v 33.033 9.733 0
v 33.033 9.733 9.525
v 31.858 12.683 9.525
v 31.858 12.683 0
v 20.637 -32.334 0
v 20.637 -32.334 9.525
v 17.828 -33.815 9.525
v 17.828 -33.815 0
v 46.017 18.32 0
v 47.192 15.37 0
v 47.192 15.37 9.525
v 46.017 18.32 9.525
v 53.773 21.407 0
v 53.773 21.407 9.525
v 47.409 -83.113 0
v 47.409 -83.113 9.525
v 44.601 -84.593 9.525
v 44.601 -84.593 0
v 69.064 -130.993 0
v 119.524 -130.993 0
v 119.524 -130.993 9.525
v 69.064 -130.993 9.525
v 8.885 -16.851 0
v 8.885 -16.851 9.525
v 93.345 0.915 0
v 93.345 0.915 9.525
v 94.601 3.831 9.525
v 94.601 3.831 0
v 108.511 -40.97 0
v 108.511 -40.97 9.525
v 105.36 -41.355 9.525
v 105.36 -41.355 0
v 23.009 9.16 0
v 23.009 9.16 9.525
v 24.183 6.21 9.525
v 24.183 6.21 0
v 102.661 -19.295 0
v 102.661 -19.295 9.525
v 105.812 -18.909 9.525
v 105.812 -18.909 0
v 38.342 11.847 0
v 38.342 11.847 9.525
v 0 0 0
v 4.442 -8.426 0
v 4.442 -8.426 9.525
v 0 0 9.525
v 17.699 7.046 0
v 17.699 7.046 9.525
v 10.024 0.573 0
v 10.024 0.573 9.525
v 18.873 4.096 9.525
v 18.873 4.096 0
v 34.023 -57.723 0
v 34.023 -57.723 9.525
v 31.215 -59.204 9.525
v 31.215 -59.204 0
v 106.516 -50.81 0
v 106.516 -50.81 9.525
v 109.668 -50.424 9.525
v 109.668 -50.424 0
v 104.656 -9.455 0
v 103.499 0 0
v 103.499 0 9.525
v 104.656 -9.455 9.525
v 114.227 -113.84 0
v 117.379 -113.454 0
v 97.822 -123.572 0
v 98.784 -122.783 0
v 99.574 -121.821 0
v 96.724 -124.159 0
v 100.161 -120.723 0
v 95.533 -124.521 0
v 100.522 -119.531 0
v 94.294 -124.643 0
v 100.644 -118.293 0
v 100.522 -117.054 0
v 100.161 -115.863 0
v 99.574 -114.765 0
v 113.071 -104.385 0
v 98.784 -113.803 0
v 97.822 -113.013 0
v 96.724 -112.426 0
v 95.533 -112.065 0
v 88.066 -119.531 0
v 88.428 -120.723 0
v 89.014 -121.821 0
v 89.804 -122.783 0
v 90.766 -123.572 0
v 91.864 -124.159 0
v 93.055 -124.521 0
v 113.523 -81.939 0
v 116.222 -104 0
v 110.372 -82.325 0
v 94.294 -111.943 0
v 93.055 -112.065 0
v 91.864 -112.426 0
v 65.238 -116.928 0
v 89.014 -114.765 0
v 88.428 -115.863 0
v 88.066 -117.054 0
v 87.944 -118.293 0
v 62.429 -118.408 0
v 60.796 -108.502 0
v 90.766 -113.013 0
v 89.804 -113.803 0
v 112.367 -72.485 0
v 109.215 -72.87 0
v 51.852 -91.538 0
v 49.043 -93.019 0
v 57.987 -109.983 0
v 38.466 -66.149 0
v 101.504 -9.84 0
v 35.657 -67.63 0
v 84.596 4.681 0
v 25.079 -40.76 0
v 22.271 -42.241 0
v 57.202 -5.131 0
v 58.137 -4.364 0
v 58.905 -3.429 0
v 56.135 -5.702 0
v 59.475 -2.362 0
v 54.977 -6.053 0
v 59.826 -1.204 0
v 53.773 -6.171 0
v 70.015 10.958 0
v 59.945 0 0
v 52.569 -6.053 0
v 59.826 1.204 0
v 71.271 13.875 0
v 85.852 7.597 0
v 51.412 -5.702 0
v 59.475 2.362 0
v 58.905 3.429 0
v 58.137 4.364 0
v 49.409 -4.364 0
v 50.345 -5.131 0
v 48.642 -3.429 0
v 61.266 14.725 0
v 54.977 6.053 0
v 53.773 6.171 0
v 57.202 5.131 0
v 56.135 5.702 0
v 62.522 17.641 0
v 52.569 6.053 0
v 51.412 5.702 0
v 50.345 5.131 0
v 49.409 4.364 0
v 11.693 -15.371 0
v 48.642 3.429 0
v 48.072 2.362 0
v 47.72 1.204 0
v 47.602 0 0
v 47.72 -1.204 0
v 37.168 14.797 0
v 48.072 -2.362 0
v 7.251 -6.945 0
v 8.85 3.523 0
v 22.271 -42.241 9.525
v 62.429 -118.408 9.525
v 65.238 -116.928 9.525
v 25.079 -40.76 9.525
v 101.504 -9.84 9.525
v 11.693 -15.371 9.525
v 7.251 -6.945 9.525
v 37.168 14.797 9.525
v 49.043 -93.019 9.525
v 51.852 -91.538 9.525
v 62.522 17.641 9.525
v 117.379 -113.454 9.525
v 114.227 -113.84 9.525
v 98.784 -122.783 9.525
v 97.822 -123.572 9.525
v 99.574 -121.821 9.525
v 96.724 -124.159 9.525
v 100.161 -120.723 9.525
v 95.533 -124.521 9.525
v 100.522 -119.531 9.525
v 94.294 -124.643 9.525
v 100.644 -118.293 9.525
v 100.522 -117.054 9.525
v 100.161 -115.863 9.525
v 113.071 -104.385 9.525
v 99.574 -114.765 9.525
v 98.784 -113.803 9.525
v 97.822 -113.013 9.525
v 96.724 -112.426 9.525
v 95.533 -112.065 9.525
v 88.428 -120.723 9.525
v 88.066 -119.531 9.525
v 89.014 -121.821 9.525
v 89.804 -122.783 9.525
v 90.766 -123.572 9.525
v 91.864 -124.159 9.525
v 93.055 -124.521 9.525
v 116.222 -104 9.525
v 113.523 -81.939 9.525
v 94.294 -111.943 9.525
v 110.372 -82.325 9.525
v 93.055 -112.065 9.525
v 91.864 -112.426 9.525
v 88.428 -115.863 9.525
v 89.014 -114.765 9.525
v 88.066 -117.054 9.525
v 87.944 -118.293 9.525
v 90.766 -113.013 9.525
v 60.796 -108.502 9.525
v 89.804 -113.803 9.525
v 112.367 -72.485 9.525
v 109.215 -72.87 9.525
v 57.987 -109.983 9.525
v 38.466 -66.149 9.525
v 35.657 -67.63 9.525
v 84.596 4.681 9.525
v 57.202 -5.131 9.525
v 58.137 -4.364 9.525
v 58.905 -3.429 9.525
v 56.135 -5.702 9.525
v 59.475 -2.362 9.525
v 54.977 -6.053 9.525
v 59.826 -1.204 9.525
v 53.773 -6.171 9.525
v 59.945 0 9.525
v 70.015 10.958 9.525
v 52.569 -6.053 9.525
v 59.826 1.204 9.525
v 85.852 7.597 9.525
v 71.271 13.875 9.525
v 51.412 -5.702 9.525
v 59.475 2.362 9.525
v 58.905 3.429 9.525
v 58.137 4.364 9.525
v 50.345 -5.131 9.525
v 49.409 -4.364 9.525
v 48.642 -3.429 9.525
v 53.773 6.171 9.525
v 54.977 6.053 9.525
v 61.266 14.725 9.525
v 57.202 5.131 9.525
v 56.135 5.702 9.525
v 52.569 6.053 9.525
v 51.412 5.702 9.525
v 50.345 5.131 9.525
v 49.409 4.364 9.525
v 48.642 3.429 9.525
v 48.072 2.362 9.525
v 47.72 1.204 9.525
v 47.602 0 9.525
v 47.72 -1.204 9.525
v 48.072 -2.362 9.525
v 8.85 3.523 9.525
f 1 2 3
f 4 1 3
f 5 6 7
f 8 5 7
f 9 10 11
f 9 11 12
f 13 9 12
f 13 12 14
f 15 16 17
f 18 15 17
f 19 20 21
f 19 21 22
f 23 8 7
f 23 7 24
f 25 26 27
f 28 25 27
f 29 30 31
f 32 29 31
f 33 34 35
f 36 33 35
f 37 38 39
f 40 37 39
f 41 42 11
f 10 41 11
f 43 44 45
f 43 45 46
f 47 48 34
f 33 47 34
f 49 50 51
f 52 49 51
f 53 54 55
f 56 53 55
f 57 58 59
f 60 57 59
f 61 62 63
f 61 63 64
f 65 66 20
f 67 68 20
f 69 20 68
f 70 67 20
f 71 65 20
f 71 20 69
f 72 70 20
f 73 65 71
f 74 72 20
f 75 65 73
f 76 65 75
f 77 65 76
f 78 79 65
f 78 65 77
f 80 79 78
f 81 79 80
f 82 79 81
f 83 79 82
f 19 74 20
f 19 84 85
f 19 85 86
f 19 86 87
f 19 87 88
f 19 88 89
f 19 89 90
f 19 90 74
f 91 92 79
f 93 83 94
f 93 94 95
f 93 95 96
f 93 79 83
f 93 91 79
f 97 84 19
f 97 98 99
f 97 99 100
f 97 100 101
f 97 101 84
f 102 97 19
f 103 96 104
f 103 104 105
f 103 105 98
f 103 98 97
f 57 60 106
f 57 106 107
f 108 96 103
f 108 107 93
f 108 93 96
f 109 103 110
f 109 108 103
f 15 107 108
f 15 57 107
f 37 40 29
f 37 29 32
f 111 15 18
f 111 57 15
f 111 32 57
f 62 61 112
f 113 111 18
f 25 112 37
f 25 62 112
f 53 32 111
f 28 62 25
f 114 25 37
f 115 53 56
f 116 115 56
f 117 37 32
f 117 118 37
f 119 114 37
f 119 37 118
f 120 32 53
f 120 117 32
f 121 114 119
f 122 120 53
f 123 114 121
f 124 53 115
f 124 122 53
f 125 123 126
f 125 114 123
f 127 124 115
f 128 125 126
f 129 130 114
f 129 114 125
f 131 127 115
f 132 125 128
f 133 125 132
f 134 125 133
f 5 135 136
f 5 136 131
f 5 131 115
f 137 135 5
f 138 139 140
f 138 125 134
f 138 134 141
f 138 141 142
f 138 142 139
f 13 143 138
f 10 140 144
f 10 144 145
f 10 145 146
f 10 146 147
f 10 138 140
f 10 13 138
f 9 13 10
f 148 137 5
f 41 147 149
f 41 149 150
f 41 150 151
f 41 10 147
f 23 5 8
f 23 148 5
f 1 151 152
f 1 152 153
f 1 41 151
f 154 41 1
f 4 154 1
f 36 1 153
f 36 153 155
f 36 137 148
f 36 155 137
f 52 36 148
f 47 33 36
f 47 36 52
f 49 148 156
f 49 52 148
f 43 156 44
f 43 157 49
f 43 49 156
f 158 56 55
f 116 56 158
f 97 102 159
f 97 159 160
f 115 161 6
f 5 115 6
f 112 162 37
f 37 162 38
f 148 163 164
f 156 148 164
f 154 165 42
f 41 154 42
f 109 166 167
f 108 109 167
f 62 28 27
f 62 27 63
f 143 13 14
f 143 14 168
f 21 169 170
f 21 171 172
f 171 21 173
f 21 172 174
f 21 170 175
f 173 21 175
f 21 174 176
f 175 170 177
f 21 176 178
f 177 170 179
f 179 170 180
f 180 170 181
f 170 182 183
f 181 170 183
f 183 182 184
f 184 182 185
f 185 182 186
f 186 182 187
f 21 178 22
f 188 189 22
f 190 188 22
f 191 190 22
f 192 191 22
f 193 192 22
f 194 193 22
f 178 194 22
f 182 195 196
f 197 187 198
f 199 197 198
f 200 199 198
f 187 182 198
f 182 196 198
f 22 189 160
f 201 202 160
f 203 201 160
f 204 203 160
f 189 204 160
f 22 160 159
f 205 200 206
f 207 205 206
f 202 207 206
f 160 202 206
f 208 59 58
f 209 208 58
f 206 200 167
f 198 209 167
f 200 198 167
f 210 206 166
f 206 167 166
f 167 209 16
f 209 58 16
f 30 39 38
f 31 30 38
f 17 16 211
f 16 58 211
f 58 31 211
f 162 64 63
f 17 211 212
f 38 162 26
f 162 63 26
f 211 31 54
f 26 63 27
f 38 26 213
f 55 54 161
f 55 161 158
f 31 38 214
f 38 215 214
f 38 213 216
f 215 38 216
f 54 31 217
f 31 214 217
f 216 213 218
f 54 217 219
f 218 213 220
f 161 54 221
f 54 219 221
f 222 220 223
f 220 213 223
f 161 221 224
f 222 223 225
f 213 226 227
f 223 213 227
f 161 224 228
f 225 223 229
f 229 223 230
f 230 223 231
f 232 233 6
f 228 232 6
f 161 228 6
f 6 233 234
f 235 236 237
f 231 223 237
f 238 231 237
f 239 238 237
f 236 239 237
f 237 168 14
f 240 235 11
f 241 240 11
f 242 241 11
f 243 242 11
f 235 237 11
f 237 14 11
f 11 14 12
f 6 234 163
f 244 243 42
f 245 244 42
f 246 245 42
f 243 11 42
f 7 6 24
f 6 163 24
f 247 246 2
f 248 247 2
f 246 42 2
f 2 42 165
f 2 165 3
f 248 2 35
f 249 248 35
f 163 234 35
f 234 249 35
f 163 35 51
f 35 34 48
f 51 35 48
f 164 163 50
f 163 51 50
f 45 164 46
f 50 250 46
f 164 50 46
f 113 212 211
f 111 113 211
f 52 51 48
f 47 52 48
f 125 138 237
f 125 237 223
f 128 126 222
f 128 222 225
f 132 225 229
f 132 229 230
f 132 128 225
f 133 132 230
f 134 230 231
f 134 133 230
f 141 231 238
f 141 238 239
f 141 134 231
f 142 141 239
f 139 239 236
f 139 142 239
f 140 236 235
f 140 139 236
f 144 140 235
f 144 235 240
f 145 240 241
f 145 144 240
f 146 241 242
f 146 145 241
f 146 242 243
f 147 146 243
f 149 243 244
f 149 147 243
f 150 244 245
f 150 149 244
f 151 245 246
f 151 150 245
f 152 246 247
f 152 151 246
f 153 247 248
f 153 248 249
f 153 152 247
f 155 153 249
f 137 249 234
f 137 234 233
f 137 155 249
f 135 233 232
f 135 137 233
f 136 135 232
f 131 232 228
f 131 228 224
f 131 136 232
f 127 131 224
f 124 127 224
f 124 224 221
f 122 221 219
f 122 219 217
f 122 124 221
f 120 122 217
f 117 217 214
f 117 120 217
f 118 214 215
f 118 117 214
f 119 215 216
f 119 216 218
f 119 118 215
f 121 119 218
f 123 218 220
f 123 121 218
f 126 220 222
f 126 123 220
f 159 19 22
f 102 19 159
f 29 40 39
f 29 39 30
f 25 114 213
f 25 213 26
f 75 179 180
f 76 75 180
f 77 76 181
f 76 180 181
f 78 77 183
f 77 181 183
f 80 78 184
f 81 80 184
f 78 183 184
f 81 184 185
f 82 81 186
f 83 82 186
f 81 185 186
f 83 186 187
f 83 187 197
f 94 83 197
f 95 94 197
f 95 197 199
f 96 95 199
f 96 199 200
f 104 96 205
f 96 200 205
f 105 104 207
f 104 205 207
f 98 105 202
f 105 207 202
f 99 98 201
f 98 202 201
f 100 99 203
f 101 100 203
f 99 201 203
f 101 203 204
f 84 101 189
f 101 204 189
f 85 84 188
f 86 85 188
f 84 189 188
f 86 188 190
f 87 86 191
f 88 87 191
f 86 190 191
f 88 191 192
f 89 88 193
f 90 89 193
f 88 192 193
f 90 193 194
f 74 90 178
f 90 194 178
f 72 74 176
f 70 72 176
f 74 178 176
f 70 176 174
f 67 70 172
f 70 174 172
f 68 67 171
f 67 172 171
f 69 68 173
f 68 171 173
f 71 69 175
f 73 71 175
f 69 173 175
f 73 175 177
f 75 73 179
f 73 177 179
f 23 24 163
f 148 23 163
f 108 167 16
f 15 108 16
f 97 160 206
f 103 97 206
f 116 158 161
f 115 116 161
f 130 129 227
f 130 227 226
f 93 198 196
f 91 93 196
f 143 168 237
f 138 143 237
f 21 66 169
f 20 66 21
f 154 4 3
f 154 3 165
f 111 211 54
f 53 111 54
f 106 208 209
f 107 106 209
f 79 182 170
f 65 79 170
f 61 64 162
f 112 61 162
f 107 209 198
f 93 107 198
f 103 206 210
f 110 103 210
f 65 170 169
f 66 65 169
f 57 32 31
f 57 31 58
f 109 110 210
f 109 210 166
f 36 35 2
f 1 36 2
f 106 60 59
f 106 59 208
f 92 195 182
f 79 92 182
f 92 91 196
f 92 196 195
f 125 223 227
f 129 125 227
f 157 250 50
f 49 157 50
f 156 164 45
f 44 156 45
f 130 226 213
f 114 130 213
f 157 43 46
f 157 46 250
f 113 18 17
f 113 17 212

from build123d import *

# Parameters (mm, degrees)
SKETCH1_R           = 6.171386398
BOSS_EXTRUDE1_DEPTH = 9.525
CUT_EXTRUDE1_DEPTH  = 9.525
CUT_EXTRUDE2_DEPTH  = 9.525
CUT_EXTRUDE3_DEPTH  = 9.525
SKETCH3_R           = 6.35
CUT_EXTRUDE4_DEPTH  = 9.525


with BuildPart() as part:
    # Sketch1 → Boss-Extrude1 (new body)
    with BuildSketch(Plane.XY):
        Polygon((0, 0), (53.773244147, 21.40735786), (103.498996656, 0), (119.524414716, -130.99264214), (69.064214047, -130.99264214), align=None)
        with Locations((53.773244147, 0)):
            Circle(SKETCH1_R, mode=Mode.SUBTRACT)
    extrude(amount=BOSS_EXTRUDE1_DEPTH)

    # Sketch2 → Cut-Extrude1 (cut)
    with BuildSketch(Plane.XY.offset(9.525)):
        Polygon((46.017470702, 18.319751369), (37.167957105, 14.79672226), (38.342300142, 11.846884394), (47.191813738, 15.369913504), align=None)
        Polygon((31.858248947, 12.682904794), (23.008735351, 9.159875685), (24.183078387, 6.210037819), (33.032591984, 9.733066929), align=None)
        Polygon((17.699027193, 7.046058219), (8.849513596, 3.523029109), (10.023856633, 0.573191244), (18.873370229, 4.096220353), align=None)
    extrude(amount=-CUT_EXTRUDE1_DEPTH, mode=Mode.SUBTRACT)

    # Sketch2_3 → Cut-Extrude2 (cut)
    with BuildSketch(Plane.XY.offset(9.525)):
        Polygon((7.250861941, -6.944872289), (4.44231406, -8.425643642), (8.884628121, -16.851287285), (11.693176002, -15.370515931), align=None)
        Polygon((20.637034977, -32.334145131), (17.828487096, -33.814916485), (22.270801156, -42.240560127), (25.079349037, -40.759788774), align=None)
        Polygon((34.023208012, -57.723417974), (31.214660132, -59.204189327), (35.656974192, -67.629832969), (38.465522073, -66.149061616), align=None)
        Polygon((47.409381048, -83.112690816), (44.600833167, -84.593462169), (49.043147228, -93.019105812), (51.851695108, -91.538334458), align=None)
        Polygon((60.795554083, -108.501963658), (57.987006203, -109.982735012), (62.429320263, -118.408378654), (65.237868144, -116.927607301), align=None)
    extrude(amount=-CUT_EXTRUDE2_DEPTH, mode=Mode.SUBTRACT)

    # Sketch2_4 → Cut-Extrude3 (cut)
    with BuildSketch(Plane.XY.offset(9.525)):
        Polygon((71.270661843, 13.874571258), (62.521952995, 17.640964559), (61.266488562, 14.724728276), (70.015197409, 10.958334976), align=None)
        Polygon((94.600552104, 3.83085579), (85.851843256, 7.597249091), (84.596378823, 4.681012808), (93.34508767, 0.914619507), align=None)
        Polygon((105.812294522, -18.909023057), (104.655645589, -9.454511529), (101.504141746, -9.840061173), (102.660790679, -19.294572702), align=None)
        Polygon((109.667790966, -50.424061486), (108.511142033, -40.969549957), (105.35963819, -41.355099602), (106.516287124, -50.80961113), align=None)
        Polygon((110.371783568, -82.324649559), (113.523287411, -81.939099915), (112.366638477, -72.484588386), (109.215134635, -72.870138031), align=None)
        Polygon((114.227280012, -113.839687988), (117.378783855, -113.454138344), (116.222134922, -103.999626815), (113.070631079, -104.385176459), align=None)
    extrude(amount=-CUT_EXTRUDE3_DEPTH, mode=Mode.SUBTRACT)

    # Sketch3 → Cut-Extrude4 (cut)
    with BuildSketch(Plane.XY.offset(9.525)):
        with Locations((94.294314381, -118.29264214)):
            Circle(SKETCH3_R)
    extrude(amount=-CUT_EXTRUDE4_DEPTH, mode=Mode.SUBTRACT)


solid = part.part
